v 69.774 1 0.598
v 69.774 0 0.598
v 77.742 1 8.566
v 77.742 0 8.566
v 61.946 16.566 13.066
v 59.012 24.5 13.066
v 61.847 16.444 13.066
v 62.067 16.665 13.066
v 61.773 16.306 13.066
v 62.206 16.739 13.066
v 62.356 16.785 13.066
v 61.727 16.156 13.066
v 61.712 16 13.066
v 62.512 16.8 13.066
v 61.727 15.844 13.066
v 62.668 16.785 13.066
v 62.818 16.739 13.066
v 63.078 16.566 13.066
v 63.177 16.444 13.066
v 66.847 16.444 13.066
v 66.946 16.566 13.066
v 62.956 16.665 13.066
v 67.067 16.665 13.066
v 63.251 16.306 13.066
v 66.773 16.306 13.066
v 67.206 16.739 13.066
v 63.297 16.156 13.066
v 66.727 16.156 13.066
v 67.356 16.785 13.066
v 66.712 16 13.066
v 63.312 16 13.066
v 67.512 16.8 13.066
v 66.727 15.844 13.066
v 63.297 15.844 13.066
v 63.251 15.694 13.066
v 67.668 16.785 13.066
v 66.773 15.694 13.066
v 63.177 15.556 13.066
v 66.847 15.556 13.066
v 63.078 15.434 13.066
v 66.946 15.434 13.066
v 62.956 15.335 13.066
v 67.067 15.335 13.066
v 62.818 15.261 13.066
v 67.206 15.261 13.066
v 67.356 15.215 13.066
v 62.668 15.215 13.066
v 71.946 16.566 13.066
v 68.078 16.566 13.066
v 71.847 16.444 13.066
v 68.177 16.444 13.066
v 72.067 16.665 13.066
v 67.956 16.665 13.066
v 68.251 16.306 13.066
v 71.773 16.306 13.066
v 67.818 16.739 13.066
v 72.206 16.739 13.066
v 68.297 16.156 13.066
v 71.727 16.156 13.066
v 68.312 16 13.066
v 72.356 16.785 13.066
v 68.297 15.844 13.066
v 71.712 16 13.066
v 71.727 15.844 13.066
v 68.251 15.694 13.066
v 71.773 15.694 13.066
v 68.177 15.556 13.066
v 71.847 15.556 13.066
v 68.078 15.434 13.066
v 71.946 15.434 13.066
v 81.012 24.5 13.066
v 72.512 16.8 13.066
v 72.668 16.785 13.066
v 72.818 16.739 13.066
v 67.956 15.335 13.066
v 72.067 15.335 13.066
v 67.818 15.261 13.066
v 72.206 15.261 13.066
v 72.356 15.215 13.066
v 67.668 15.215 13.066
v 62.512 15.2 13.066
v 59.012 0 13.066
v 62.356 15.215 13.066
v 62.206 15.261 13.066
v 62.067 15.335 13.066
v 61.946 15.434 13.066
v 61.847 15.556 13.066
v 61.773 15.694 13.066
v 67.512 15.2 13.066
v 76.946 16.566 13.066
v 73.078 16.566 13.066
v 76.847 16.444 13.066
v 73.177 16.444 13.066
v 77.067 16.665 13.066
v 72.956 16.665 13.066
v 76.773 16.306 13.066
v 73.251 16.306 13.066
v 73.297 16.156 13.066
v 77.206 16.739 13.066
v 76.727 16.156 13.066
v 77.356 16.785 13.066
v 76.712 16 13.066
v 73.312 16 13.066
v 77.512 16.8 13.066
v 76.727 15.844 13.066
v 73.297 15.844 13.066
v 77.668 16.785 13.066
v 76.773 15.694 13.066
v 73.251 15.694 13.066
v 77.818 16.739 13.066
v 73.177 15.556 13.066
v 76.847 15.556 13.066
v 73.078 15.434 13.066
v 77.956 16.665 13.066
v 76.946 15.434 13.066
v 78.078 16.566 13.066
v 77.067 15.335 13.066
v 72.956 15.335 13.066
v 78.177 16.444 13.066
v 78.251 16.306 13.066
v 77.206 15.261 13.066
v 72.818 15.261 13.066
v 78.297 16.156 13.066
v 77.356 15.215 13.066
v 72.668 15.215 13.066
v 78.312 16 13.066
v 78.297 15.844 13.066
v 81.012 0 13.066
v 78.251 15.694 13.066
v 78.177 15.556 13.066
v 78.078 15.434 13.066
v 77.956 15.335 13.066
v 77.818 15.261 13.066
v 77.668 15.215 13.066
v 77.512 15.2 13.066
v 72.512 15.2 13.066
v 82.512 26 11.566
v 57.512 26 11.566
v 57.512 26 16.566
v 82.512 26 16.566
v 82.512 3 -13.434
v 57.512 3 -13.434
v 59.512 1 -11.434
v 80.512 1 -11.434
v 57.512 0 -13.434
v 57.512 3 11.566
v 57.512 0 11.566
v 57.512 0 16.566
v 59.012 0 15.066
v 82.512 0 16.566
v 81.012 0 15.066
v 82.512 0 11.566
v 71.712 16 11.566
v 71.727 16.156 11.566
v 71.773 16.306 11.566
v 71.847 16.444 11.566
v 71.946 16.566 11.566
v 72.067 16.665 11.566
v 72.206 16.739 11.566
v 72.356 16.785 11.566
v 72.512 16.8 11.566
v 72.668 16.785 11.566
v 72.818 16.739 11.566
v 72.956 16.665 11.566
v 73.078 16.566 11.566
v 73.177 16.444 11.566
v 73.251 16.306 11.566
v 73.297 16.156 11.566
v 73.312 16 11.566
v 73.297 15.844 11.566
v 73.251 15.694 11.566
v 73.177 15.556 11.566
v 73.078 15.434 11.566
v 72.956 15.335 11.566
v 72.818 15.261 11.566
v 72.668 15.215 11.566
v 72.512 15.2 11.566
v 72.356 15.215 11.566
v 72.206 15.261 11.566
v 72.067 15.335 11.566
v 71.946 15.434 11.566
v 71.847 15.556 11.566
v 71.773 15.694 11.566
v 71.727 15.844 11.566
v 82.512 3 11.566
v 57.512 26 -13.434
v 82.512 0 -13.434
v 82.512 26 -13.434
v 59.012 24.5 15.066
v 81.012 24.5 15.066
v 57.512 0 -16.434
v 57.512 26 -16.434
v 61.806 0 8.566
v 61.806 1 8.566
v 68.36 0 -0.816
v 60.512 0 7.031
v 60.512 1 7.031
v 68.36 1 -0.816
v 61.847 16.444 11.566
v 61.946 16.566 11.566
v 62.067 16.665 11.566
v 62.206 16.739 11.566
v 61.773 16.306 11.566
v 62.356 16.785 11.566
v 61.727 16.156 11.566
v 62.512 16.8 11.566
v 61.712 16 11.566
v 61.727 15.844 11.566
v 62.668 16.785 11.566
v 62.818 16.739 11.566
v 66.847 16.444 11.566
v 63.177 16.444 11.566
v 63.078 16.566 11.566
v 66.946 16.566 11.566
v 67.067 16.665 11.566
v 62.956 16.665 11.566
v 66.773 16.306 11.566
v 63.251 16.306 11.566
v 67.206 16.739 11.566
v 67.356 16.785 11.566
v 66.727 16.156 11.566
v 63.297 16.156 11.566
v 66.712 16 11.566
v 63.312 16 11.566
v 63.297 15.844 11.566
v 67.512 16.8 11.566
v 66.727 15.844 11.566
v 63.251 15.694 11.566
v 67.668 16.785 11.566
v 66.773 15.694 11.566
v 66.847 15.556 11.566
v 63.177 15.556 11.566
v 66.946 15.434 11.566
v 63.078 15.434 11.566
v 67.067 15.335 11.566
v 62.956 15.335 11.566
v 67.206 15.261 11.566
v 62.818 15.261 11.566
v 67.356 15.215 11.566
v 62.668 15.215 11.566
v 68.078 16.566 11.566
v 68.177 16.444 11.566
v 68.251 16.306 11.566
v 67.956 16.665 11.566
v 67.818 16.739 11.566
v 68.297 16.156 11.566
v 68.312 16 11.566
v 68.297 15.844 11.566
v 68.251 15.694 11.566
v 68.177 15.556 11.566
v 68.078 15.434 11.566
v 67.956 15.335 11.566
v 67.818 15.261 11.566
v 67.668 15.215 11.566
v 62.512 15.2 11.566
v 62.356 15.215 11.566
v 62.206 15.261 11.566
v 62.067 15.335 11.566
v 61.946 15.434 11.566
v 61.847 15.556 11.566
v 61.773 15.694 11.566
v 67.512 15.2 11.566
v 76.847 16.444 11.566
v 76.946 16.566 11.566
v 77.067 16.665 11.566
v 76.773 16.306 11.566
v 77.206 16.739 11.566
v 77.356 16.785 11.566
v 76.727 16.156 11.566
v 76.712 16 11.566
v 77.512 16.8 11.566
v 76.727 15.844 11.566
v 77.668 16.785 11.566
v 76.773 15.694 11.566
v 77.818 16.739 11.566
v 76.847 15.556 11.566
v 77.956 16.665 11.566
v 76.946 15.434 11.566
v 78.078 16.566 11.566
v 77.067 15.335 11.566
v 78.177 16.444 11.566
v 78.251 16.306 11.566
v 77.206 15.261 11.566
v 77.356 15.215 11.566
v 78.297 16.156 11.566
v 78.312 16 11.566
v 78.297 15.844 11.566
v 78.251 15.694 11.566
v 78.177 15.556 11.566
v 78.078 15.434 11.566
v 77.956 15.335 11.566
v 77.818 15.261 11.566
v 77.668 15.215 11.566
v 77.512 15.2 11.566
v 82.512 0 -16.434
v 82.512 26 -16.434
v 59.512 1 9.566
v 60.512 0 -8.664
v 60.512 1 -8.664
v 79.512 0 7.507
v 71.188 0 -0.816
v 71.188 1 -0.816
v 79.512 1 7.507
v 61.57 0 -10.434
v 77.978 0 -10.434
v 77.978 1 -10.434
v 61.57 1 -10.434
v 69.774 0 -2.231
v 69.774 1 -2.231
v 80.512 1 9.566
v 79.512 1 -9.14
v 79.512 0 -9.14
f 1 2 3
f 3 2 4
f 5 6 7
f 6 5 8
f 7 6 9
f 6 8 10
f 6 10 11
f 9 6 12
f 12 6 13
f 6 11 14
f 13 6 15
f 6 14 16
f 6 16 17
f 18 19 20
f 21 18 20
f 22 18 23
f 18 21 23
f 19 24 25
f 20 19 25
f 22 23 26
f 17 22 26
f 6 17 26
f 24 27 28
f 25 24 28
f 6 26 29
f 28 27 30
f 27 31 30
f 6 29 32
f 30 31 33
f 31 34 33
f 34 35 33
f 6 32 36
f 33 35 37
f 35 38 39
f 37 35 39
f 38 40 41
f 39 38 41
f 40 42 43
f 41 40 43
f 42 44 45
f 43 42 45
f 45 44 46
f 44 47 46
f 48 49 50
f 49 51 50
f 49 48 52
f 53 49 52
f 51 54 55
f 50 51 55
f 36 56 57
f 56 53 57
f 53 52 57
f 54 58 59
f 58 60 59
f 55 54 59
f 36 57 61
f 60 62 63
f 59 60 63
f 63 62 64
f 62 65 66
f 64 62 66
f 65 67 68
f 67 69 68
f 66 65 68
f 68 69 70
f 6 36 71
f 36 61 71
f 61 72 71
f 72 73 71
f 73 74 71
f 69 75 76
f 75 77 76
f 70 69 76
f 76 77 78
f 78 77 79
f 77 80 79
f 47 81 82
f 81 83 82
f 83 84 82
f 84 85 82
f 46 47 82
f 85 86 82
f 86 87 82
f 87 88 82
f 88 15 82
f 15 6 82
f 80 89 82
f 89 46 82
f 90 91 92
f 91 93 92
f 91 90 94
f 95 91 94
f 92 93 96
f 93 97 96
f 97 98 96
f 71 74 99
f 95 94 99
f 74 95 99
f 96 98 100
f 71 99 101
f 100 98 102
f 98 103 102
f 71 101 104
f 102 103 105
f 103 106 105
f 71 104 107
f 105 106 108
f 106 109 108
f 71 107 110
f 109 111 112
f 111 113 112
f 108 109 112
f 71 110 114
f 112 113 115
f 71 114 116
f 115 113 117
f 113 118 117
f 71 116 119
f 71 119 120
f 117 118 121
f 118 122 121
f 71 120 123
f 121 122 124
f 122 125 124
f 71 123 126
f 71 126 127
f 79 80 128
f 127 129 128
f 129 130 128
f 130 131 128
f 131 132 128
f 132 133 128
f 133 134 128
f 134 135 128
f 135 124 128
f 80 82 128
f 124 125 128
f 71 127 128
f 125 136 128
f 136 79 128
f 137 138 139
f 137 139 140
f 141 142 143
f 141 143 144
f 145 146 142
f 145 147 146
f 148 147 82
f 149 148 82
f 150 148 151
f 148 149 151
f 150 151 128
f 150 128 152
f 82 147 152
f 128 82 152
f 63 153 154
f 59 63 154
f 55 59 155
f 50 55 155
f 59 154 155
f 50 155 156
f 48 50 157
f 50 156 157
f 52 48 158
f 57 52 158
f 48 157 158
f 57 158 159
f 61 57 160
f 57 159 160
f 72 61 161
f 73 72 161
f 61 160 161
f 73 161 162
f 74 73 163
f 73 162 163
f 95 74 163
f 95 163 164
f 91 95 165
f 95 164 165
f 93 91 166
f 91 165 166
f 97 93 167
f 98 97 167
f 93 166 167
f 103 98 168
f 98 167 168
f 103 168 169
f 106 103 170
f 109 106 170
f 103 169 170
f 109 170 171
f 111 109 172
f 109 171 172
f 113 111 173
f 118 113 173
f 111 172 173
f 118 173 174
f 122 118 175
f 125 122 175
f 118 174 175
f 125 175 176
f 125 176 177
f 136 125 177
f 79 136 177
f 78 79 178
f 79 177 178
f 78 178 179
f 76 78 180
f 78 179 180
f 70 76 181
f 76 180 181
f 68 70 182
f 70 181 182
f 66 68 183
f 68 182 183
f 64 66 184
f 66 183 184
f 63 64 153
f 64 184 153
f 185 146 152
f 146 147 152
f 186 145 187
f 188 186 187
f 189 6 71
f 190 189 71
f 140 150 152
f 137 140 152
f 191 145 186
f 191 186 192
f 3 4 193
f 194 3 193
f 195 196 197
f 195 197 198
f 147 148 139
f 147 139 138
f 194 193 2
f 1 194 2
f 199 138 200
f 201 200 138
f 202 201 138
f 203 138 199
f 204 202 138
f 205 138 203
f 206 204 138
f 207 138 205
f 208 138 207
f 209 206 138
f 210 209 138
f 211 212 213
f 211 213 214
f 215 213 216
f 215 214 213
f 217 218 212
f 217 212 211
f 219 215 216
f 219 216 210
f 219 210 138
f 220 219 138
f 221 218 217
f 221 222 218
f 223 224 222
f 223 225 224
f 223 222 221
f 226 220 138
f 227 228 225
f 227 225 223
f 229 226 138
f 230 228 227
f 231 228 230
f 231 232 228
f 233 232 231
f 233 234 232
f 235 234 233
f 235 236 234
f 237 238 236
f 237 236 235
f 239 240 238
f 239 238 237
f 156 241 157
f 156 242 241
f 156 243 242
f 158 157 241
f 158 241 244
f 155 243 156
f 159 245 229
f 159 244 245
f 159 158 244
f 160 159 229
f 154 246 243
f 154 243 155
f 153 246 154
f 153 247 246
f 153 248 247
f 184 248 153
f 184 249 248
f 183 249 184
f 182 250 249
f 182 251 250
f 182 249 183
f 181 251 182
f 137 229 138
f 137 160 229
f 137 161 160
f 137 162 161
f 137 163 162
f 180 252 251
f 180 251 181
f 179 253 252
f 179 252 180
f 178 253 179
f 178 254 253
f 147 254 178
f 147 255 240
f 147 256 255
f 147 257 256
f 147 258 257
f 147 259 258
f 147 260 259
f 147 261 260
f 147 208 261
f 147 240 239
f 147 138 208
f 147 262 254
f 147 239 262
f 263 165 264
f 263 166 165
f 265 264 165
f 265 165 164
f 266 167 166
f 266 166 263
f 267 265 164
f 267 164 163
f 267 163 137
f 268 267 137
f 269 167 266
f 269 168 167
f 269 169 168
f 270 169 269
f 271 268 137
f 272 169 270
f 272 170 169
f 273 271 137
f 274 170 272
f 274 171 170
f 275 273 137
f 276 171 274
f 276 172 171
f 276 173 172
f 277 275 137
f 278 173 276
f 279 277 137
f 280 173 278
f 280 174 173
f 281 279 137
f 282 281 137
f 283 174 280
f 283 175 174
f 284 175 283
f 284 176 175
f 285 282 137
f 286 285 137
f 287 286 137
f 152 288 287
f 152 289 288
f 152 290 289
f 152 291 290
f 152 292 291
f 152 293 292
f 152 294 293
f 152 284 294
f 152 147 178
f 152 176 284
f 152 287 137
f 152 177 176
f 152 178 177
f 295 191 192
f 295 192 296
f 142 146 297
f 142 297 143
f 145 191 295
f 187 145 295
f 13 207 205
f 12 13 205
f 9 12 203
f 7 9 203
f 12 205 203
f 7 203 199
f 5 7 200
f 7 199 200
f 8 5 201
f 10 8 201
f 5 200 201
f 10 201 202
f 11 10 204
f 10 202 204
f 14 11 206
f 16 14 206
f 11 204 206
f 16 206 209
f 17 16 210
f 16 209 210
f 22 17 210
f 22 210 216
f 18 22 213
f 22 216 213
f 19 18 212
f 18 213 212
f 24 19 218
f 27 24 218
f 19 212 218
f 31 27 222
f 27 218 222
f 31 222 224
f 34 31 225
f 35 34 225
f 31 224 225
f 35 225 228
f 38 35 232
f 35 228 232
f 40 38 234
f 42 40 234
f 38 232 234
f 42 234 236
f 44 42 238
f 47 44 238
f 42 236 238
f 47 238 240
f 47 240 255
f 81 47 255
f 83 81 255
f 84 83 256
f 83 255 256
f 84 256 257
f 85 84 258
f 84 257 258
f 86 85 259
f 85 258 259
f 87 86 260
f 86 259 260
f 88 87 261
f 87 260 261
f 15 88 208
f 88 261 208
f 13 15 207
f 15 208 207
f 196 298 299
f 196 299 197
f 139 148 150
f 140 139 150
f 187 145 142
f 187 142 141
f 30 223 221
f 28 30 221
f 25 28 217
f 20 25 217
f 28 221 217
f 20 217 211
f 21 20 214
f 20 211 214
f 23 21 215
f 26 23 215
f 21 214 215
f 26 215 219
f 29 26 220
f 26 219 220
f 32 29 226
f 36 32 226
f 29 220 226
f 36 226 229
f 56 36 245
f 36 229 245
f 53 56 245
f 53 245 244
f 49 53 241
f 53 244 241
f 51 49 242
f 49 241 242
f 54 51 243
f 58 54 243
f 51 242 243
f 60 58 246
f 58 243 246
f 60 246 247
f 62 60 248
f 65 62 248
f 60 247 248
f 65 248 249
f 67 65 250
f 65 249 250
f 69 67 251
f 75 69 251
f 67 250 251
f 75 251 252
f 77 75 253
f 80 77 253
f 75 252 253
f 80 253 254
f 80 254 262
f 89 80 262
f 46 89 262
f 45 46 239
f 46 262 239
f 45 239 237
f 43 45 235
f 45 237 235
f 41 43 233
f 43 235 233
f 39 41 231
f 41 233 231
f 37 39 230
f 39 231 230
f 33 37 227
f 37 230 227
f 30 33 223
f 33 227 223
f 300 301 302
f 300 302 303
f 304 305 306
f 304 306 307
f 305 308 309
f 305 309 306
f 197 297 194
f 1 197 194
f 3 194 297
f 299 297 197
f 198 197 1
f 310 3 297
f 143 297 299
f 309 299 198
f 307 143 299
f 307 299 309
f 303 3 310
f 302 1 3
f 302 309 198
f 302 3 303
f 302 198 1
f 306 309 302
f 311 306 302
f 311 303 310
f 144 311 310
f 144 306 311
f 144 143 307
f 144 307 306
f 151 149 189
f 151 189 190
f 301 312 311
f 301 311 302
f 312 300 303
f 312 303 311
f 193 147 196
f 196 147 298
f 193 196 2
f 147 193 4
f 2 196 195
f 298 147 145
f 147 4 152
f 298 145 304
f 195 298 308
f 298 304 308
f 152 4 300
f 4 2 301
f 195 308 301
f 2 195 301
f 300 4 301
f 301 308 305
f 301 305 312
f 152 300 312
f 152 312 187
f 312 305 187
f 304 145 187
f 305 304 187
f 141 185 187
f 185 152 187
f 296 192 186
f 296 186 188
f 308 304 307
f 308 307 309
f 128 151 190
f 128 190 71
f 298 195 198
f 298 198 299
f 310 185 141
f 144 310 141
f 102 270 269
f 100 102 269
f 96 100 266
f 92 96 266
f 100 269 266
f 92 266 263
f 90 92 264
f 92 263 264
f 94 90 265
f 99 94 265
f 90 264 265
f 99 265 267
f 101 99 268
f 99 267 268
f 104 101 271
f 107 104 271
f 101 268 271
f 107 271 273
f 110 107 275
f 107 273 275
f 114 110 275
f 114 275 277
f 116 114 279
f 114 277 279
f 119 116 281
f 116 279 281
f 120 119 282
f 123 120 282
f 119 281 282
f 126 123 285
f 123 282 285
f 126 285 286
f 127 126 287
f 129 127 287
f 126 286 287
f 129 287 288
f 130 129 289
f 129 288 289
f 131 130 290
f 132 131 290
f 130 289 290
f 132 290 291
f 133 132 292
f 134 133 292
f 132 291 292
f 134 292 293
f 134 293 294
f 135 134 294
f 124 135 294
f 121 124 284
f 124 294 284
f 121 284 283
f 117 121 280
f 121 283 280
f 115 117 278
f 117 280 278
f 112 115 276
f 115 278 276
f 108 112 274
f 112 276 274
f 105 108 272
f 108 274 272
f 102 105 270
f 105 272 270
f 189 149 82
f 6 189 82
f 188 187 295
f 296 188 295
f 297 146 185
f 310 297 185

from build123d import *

# Parameters (mm, degrees)
SKIZZE1_W                         = 25
SKIZZE1_H                         = 25
AUFSATZ_LINEAR_AUSTRAGEN1_DEPTH   = 1
SKIZZE2_W                         = 25
SKIZZE2_H                         = 25
SKIZZE2_W_2                       = 21
SKIZZE2_H_2                       = 21
AUFSATZ_LINEAR_AUSTRAGEN2_DEPTH   = 2
FASE1_SIZE                        = 2
SKIZZE3_W                         = 25
SKIZZE3_H                         = 5
AUFSATZ_LINEAR_AUSTRAGEN3_DEPTH   = 26
SKIZZE3_H_2                       = 3
AUFSATZ_LINEAR_AUSTRAGEN3_2_DEPTH = 26
WANDUNG1_T                        = -1.5
SKIZZE4_R                         = 0.8
SCHNITT_LINEAR_AUSTRAGEN1_DEPTH   = 1.5


with BuildPart() as part:
    # Skizze1 → Aufsatz-Linear austragen1 (new body)
    with BuildSketch(Plane(origin=(0, 0, 0), x_dir=(1, 0, 0), z_dir=(0, 1, 0))):
        with Locations((70.01188303, 0.934256055)):
            Rectangle(SKIZZE1_W, SKIZZE1_H)
        Polygon((69.774043995, 2.230680518), (77.977619533, 10.434256055), (61.570468458, 10.434256055), align=None, mode=Mode.SUBTRACT)
        Polygon((60.51188303, -7.031480447), (68.359830433, 0.816466956), (60.51188303, 8.664414358), align=None, mode=Mode.SUBTRACT)
        Polygon((61.806046657, -8.565743945), (69.774043995, -0.597746607), (77.742041333, -8.565743945), align=None, mode=Mode.SUBTRACT)
        Polygon((71.188257558, 0.816466956), (79.51188303, -7.507158517), (79.51188303, 9.140092428), align=None, mode=Mode.SUBTRACT)
    extrude(amount=AUFSATZ_LINEAR_AUSTRAGEN1_DEPTH)

    # Skizze2 → Aufsatz-Linear austragen2 (add)
    with BuildSketch(Plane(origin=(0, 1, 0), x_dir=(1, 0, 0), z_dir=(0, 1, 0))):
        with Locations((70.01188303, 0.934256055)):
            Rectangle(SKIZZE2_W, SKIZZE2_H)
        with Locations((70.01188303, 0.934256055)):
            Rectangle(SKIZZE2_W_2, SKIZZE2_H_2, mode=Mode.SUBTRACT)
    extrude(amount=AUFSATZ_LINEAR_AUSTRAGEN2_DEPTH)

    # Fase1
    fase1_edges = [part.edges().sort_by_distance(p)[0] for p in [
        (70.01188303, 3, 9.565743945),
        (80.51188303, 3, -0.934256055),
        (59.51188303, 3, -0.934256055),
        (70.01188303, 3, -11.434256055),
    ]]
    chamfer(fase1_edges, length=FASE1_SIZE - 0.0001)  # a hair under: the kernel refuses the full size


with BuildPart() as body_2:
    # Skizze3 → Aufsatz-Linear austragen3 (new body)
    with BuildSketch(Plane(origin=(0, 0, 0), x_dir=(1, 0, 0), z_dir=(0, 1, 0))):
        with Locations((70.01188303, -14.065743945)):
            Rectangle(SKIZZE3_W, SKIZZE3_H)
    extrude(amount=AUFSATZ_LINEAR_AUSTRAGEN3_DEPTH)

    # Wandung1
    wandung1_openings = [body_2.faces().sort_by_distance(p)[0] for p in [
        (70.01188303, 0, 14.065743945),
    ]]
    offset(amount=WANDUNG1_T, openings=wandung1_openings, kind=Kind.INTERSECTION)

    # Skizze4 → Schnitt-Linear austragen1 (cut)
    with BuildSketch(Plane(origin=(0, 0, 11.565743945), x_dir=(-1, 0, 0), z_dir=(0, 0, -1))):
        with Locations((-62.51188303, 16)):
            Circle(SKIZZE4_R)
        with Locations((-67.51188303, 16)):
            Circle(SKIZZE4_R)
        with Locations((-72.51188303, 16)):
            Circle(SKIZZE4_R)
        with Locations((-77.51188303, 16)):
            Circle(SKIZZE4_R)
    extrude(amount=-SCHNITT_LINEAR_AUSTRAGEN1_DEPTH, mode=Mode.SUBTRACT)


with BuildPart() as body_3:
    # Skizze3 → Aufsatz-Linear austragen3 2 (new body)
    with BuildSketch(Plane(origin=(0, 0, 0), x_dir=(1, 0, 0), z_dir=(0, 1, 0))):
        with Locations((70.01188303, 14.934256055)):
            Rectangle(SKIZZE3_W, SKIZZE3_H_2)
    extrude(amount=AUFSATZ_LINEAR_AUSTRAGEN3_2_DEPTH)


solid = Compound([part.part, body_2.part, body_3.part])
